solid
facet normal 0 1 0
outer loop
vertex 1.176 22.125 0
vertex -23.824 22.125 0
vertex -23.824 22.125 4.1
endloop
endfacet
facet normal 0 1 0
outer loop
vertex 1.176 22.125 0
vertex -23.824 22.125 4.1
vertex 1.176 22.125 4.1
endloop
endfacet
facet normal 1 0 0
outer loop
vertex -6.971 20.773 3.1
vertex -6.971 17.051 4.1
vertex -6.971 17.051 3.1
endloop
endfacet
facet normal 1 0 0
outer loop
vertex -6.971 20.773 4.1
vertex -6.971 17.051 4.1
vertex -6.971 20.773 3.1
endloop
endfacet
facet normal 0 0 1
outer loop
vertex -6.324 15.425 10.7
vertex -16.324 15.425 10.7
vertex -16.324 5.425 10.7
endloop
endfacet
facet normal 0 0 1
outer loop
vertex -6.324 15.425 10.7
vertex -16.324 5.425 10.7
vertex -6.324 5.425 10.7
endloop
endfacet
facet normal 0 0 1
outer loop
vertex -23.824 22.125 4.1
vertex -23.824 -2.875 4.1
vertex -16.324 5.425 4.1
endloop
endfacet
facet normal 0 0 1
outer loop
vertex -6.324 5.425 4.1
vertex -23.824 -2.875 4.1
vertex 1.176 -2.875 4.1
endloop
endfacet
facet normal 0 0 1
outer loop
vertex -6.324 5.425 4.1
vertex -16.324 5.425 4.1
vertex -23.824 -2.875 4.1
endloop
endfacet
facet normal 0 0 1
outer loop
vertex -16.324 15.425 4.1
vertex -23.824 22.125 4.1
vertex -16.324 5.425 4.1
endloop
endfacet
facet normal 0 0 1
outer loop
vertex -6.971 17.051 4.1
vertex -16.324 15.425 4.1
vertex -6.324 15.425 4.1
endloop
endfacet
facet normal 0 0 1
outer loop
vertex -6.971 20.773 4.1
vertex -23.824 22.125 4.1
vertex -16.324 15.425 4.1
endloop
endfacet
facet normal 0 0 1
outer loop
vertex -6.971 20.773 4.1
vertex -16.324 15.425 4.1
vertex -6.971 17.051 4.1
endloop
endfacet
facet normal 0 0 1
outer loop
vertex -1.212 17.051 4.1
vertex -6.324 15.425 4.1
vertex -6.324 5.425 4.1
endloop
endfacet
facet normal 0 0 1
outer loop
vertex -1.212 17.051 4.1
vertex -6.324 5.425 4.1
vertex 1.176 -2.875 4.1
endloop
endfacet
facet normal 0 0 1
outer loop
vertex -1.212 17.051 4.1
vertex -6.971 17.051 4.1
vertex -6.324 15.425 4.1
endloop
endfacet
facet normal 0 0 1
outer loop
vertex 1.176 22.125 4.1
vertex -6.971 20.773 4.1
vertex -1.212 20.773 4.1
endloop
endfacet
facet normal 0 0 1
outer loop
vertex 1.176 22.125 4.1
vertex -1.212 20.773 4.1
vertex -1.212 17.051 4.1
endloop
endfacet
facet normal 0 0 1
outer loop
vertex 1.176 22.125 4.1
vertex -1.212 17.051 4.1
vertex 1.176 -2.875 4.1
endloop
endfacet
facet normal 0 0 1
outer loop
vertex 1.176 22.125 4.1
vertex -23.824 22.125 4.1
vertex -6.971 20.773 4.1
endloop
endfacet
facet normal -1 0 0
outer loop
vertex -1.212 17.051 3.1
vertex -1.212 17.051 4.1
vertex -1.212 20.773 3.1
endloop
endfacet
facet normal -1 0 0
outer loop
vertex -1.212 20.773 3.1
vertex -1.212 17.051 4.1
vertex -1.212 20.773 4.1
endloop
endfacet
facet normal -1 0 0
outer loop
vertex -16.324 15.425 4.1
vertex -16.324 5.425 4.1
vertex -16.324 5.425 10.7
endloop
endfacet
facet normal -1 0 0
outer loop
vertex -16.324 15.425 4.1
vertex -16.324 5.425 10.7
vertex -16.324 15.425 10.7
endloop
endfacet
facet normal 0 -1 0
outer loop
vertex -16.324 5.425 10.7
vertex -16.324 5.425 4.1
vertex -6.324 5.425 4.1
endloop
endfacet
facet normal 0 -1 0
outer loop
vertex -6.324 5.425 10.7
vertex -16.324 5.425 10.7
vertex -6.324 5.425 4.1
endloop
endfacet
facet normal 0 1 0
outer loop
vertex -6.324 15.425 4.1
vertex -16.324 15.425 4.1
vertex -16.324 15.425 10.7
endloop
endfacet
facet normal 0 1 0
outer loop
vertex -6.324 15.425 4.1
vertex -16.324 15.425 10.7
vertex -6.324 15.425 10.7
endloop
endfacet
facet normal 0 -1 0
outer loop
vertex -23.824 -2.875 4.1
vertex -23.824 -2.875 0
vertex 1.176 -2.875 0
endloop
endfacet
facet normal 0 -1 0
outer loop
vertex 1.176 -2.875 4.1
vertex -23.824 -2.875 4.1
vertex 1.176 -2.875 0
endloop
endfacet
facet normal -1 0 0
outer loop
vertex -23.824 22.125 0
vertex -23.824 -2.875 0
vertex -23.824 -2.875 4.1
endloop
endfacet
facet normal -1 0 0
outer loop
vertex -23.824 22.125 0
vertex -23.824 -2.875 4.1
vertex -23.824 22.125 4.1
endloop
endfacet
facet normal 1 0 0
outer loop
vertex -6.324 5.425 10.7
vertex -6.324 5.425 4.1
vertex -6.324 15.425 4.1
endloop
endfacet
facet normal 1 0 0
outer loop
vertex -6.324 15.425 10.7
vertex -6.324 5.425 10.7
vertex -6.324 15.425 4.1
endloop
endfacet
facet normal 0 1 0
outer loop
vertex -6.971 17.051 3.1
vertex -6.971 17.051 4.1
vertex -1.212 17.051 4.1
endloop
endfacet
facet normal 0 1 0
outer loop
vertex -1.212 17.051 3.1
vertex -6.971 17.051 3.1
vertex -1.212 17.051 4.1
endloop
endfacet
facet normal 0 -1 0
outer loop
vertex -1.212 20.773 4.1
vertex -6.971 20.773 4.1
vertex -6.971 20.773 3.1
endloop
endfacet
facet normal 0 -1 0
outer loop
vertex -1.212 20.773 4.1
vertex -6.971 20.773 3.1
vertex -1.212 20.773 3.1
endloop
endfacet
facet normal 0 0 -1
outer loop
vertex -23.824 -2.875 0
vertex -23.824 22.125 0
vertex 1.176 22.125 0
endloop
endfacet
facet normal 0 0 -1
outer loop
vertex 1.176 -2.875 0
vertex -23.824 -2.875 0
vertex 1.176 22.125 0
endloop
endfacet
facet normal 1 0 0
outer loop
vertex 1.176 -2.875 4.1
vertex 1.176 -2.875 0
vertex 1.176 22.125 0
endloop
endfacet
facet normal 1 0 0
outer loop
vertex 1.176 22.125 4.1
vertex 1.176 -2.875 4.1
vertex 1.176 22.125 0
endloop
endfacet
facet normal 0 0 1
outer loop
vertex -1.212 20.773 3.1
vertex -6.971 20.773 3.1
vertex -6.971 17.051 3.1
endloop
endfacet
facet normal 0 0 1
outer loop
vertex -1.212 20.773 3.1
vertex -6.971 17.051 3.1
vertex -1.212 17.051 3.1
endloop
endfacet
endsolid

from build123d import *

# Parameters (mm, degrees)
SKETCH_1_W          = 25
SKETCH_1_H          = 25
EXTRUDE_1_DEPTH     = 4.1
SKETCH_2_W          = 10
SKETCH_2_H          = 10
EXTRUDE_2_DEPTH     = 6.6
SKETCH_3_W          = 5.758400008
SKETCH_3_H          = 3.721892688
CUT_EXTRUDE_1_DEPTH = 1


with BuildPart() as part:
    # 草图1 → 凸台-拉伸1 (new body)
    with BuildSketch(Plane.XY):
        with Locations((-11.324496329, 9.624744468)):
            Rectangle(SKETCH_1_W, SKETCH_1_H)
    extrude(amount=EXTRUDE_1_DEPTH)

    # 草图2 → 凸台-拉伸2 (add)
    with BuildSketch(Plane.XY.offset(4.1)):
        with Locations((-11.324496329, 10.424744468)):
            Rectangle(SKETCH_2_W, SKETCH_2_H)
    extrude(amount=EXTRUDE_2_DEPTH)

    # 草图3 → 切除-拉伸1 (cut)
    with BuildSketch(Plane.XY.offset(4.1)):
        with Locations((-4.091384125, 18.91192009)):
            Rectangle(SKETCH_3_W, SKETCH_3_H)
    extrude(amount=-CUT_EXTRUDE_1_DEPTH, mode=Mode.SUBTRACT)


solid = part.part
